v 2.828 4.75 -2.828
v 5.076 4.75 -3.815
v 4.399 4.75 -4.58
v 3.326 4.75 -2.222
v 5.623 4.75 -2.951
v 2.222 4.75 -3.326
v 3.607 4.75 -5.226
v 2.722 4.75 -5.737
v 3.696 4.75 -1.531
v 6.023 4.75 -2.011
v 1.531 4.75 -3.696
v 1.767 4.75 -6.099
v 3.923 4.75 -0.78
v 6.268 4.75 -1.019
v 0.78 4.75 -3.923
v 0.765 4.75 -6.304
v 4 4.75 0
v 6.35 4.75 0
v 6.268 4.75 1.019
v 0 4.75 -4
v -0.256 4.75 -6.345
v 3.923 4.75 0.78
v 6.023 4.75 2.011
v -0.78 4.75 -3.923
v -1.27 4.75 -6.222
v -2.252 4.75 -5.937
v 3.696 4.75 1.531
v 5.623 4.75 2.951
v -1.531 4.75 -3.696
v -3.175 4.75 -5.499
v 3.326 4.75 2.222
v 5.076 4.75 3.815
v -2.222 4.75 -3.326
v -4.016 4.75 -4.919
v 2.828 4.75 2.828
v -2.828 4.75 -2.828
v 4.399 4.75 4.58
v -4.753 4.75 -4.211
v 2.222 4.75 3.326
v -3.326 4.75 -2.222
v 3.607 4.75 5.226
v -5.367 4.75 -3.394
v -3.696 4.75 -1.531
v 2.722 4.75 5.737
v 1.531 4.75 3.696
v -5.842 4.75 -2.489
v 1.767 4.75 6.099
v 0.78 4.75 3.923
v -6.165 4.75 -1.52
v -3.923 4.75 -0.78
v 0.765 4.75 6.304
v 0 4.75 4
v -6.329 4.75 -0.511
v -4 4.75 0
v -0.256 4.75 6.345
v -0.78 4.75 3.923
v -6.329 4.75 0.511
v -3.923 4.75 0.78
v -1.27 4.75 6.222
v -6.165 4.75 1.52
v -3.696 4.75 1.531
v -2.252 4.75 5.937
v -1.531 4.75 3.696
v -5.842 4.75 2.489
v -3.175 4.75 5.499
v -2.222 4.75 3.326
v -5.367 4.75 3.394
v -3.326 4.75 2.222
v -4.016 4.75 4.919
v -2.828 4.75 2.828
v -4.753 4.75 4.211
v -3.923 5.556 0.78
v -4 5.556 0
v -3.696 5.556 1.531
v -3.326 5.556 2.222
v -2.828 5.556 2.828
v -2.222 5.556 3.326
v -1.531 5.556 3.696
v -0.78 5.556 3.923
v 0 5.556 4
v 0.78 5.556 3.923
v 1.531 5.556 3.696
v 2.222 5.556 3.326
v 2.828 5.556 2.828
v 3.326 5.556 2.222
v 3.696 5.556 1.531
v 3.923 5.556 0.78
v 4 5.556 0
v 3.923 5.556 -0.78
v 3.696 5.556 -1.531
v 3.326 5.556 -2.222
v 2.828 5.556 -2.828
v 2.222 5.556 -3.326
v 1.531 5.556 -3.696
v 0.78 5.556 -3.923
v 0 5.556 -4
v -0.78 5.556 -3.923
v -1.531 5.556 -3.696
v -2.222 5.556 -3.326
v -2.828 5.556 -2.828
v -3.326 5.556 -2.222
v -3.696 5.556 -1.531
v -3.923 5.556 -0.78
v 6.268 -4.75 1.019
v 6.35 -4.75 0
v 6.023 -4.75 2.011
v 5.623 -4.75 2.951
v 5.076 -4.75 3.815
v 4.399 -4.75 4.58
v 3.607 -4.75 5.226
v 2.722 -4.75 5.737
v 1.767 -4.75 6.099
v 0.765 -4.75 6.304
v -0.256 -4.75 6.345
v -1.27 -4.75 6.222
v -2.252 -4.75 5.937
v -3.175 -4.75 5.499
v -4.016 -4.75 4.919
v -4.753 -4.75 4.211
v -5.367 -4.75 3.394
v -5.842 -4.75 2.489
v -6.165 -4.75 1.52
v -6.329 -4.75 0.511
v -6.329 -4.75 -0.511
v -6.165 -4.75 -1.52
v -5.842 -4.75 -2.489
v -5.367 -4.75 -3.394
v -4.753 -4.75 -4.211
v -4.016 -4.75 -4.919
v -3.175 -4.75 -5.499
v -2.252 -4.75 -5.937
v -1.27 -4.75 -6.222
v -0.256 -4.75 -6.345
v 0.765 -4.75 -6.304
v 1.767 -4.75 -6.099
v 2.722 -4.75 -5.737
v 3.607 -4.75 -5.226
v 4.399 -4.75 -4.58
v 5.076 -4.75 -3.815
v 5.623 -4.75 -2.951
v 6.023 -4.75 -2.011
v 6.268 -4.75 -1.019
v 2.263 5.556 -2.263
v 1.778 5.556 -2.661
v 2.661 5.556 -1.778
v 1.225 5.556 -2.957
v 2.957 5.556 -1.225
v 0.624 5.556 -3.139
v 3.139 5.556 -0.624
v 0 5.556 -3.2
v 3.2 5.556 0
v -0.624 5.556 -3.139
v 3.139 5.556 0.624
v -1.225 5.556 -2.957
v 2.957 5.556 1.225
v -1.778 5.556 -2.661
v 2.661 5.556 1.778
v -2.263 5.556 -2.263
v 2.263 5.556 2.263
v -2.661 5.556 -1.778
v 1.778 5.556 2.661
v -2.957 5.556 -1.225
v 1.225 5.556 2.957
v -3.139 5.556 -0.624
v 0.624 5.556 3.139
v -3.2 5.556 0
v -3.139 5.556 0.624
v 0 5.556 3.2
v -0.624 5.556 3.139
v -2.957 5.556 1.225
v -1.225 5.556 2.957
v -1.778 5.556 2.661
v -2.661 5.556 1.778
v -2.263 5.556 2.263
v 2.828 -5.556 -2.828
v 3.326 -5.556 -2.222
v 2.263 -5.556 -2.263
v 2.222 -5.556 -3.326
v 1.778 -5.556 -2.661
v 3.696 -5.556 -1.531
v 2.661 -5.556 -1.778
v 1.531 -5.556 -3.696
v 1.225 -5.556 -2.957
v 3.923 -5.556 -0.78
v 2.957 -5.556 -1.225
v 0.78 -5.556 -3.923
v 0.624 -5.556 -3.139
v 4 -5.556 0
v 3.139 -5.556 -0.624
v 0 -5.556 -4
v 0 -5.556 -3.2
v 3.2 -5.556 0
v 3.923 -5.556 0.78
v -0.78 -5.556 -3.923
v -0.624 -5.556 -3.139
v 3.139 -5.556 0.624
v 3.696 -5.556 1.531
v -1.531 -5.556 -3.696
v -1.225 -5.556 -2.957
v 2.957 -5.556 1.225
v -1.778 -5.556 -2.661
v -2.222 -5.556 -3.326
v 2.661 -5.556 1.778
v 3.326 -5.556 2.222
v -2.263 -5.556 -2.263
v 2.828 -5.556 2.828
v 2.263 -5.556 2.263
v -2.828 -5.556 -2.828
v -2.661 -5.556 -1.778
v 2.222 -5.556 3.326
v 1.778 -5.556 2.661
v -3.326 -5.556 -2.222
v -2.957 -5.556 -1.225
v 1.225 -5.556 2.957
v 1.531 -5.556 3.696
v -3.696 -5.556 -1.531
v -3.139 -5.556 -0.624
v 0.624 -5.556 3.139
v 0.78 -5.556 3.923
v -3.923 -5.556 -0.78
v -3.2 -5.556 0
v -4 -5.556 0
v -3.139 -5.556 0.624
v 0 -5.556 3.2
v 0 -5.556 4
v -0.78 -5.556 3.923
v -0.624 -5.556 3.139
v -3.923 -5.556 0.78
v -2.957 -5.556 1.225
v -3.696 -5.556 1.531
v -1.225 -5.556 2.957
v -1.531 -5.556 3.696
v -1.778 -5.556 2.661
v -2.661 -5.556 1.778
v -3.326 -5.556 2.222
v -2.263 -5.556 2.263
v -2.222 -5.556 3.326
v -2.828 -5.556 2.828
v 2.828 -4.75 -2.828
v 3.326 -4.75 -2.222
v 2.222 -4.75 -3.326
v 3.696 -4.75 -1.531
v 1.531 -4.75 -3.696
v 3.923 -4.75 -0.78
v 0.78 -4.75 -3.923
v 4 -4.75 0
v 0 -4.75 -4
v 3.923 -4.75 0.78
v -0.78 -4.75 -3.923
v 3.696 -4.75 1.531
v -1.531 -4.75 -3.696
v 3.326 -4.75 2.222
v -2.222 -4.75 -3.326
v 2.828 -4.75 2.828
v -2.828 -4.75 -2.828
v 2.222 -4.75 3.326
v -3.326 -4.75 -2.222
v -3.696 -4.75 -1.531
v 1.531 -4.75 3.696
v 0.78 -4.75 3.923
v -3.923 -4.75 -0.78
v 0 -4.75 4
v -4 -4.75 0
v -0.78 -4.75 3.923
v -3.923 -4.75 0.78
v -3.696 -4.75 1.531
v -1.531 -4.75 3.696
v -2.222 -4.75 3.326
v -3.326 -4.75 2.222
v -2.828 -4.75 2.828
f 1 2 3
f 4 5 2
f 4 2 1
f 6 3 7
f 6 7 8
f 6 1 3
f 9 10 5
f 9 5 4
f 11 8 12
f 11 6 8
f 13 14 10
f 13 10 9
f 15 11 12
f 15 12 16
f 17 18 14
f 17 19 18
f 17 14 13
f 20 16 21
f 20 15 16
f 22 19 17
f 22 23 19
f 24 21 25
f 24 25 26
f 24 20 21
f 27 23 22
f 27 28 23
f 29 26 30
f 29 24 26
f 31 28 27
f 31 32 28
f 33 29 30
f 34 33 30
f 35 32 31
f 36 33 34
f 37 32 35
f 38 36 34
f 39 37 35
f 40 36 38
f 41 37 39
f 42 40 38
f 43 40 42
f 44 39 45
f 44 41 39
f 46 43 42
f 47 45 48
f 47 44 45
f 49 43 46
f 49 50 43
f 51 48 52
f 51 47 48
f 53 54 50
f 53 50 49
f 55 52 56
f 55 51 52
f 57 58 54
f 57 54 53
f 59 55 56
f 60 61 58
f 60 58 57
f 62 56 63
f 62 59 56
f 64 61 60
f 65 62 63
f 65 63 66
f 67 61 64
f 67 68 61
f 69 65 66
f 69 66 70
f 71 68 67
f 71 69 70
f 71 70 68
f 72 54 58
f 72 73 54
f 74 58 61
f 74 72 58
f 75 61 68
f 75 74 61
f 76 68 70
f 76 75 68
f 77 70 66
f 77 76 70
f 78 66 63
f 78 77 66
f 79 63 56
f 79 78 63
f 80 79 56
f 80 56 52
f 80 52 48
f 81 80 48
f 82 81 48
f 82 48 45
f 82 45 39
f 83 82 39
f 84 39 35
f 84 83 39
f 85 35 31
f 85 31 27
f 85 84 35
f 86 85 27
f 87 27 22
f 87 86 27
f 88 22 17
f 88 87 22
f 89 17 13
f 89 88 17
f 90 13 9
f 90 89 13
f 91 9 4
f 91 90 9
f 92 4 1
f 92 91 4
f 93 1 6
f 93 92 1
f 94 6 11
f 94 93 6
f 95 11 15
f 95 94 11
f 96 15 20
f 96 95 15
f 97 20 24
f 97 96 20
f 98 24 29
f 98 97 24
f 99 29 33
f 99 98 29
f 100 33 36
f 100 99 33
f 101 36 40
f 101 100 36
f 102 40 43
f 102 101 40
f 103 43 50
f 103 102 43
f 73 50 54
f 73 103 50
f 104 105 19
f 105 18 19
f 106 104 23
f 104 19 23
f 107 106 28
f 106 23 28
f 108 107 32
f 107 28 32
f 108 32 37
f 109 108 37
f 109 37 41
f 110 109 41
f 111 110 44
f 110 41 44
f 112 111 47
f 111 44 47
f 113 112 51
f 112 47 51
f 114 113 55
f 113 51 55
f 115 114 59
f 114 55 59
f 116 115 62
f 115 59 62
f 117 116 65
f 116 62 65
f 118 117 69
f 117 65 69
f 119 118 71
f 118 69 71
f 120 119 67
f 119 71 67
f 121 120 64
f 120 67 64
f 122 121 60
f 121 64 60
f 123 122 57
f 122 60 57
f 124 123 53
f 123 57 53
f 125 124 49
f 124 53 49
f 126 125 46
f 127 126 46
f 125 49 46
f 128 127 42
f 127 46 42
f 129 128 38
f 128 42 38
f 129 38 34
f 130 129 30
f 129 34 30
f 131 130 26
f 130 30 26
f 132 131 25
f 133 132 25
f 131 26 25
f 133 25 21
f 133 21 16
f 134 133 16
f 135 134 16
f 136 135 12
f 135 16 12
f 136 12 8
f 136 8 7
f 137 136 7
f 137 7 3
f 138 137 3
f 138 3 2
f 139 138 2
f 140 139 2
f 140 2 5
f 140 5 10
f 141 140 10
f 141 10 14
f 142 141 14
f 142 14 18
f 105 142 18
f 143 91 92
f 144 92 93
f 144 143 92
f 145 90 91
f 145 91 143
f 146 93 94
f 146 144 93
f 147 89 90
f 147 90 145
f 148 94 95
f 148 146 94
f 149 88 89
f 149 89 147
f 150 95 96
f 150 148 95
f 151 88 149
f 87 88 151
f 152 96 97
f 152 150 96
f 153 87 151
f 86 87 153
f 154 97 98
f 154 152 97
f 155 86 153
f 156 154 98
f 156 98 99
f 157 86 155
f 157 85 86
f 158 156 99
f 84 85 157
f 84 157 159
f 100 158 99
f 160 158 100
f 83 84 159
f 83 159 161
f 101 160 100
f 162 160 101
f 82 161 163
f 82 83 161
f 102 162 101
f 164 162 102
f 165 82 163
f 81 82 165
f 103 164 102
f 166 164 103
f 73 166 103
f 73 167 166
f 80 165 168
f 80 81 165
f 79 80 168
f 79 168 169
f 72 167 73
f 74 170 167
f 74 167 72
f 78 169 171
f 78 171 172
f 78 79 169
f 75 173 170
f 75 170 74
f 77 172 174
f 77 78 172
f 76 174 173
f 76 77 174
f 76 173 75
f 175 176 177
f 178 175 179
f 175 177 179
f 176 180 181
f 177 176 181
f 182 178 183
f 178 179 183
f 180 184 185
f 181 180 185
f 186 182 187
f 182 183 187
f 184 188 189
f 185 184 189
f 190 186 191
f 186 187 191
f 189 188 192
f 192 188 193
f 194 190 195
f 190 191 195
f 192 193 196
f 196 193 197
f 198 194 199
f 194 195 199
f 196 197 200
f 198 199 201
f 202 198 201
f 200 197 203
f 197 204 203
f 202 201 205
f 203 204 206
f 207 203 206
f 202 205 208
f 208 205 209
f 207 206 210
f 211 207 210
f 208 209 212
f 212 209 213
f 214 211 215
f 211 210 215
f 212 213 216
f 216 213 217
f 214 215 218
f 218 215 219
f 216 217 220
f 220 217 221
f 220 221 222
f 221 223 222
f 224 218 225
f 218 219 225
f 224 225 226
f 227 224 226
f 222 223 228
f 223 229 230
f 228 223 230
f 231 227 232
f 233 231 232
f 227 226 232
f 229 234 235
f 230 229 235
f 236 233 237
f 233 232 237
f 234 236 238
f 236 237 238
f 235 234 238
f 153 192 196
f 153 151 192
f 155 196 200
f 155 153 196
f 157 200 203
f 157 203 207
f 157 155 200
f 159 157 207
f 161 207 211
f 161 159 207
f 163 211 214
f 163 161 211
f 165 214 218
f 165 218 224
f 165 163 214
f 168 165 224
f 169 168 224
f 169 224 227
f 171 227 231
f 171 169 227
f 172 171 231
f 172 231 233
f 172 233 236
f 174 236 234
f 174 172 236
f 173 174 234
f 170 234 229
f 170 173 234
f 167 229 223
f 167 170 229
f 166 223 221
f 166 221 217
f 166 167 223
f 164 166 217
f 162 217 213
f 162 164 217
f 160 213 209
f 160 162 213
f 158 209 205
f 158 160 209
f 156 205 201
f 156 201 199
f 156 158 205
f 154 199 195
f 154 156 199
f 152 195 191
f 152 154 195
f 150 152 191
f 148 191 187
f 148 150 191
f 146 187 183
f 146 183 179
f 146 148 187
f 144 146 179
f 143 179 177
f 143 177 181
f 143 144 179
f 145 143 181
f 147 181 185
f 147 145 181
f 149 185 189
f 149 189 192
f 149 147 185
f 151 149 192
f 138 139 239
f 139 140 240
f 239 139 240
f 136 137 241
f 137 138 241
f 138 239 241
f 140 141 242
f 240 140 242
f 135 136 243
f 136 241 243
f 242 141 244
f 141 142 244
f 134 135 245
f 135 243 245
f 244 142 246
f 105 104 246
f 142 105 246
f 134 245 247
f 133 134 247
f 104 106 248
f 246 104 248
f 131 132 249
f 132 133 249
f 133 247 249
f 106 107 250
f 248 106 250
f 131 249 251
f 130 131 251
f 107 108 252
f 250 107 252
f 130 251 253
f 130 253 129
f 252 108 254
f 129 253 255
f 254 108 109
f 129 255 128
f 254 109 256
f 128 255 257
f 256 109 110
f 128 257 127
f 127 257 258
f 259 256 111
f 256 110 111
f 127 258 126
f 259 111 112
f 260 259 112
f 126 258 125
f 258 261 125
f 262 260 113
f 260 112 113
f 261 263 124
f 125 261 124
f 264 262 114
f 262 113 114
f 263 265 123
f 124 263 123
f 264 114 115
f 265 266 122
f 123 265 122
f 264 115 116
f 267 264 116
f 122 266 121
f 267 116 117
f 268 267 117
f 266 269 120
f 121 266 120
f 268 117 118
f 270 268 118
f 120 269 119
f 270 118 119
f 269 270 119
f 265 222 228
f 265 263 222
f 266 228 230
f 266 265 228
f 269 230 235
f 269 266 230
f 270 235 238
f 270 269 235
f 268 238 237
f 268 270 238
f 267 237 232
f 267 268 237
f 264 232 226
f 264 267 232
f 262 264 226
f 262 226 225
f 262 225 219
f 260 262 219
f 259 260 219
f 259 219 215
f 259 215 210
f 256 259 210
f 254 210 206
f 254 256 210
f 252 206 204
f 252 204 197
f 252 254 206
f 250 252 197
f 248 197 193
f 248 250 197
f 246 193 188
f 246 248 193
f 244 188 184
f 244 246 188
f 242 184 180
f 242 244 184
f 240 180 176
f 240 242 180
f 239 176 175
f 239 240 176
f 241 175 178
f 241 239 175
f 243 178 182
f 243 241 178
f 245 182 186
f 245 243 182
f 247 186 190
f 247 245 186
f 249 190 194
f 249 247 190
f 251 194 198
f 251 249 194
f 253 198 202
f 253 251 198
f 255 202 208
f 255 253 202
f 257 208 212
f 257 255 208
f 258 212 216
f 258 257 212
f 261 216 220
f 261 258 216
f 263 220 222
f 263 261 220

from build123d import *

# Parameters (mm, degrees)
SKETCH1_W = 3.1496
SKETCH1_H = 11.1125
SKETCH2_W = 2.35
SKETCH2_H = 0.80625


with BuildPart() as part:
    # Sketch1 → Revolve1 (revolve)
    with BuildSketch(Plane.XY):
        with Locations((4.7752, 0)):
            Rectangle(SKETCH1_W, SKETCH1_H)
    revolve(axis=Axis((0, 5.55625, 0), (0, -1, 0)))

    # Sketch2 → Cut-Revolve1 (revolve, cut)
    with BuildSketch(Plane.XY):
        with Locations((-5.175, 5.153125)):
            Rectangle(SKETCH2_W, SKETCH2_H)
        with Locations((-5.175, -5.153125)):
            Rectangle(SKETCH2_W, SKETCH2_H)
    revolve(axis=Axis((0, -6.044864414, 0), (0, 1, 0)), mode=Mode.SUBTRACT)


solid = part.part
